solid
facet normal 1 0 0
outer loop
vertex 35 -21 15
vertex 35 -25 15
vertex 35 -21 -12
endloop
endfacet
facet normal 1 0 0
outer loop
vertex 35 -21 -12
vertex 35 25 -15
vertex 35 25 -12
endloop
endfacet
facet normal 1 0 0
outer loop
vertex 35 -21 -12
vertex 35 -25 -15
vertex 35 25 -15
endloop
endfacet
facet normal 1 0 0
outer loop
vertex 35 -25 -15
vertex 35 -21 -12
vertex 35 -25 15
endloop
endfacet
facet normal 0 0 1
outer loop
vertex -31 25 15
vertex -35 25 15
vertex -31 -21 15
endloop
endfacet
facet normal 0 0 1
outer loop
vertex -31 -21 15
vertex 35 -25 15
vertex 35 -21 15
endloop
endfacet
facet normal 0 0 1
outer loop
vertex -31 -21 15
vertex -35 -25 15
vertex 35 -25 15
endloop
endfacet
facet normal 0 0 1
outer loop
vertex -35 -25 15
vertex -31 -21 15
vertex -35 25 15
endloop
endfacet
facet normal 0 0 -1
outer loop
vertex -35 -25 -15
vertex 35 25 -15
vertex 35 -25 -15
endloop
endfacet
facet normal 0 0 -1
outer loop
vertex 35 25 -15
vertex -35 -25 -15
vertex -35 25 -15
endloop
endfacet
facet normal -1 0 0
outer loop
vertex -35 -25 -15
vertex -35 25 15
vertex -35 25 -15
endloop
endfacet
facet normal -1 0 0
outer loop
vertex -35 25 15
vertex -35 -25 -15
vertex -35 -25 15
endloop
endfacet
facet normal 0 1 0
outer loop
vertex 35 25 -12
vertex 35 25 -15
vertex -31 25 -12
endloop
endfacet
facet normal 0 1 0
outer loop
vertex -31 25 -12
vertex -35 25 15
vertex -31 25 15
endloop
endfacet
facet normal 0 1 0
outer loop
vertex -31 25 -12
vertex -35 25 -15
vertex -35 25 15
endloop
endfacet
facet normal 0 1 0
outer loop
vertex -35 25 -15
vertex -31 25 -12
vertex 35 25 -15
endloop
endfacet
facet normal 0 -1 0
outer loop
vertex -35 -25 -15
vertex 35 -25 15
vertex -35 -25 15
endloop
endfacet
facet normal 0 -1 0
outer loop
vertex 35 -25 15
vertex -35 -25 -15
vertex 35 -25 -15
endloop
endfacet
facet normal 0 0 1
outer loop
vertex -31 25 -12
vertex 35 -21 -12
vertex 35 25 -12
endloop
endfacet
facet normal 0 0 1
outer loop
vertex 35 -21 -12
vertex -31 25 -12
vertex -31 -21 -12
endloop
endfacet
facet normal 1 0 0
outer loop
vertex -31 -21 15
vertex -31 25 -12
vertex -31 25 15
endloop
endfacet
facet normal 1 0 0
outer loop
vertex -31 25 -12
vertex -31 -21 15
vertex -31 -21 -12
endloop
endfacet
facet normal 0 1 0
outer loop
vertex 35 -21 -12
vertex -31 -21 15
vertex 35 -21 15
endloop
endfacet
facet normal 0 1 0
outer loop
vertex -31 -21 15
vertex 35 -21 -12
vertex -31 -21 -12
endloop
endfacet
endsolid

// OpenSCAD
$fn = 128; // High resolution for smooth curves and precise fits

// --- Part 1: Box Dimensions ---
// Outer dimensions (X x Y x Z)
BOX_OUT_X = 70;
BOX_OUT_Y = 50;
BOX_OUT_Z = 30;

// Wall and floor thickness
WALL_THICKNESS = 2;
FLOOR_THICKNESS = 2;

// --- Part 2: Lid Dimensions ---
// Plate dimensions (same as box outer footprint)
LID_PLATE_X = 70;
LID_PLATE_Y = 50;
LID_PLATE_Z = 2; // Thickness of the base plate

// Lip dimensions
LIP_WALL_THICKNESS = 1.5;
LIP_HEIGHT = 4; // Height of the lip above the plate

// Lip outer size (calculated to provide 0.2mm clearance inside the 70x50 box)
// Box inner width = 70 - 2*2 = 66. Target clearance = 0.2. Lip width = 66 - 2*0.2 = 65.6
// Box inner depth = 50 - 2*2 = 46. Target clearance = 0.2. Lip depth = 46 - 2*0.2 = 45.6
LIP_OUT_X = 65.6;
LIP_OUT_Y = 45.6;

// --- Assembly Positioning ---
// Gap between parts
GAP = 10;

// Positioning variables
// Box is centred at X=0, Y=0, Z=0 (bottom at 0)
// Lid is placed on the +X side with a 10mm gap
// Lid X position = (Box X / 2) + GAP + (Lid X / 2)
// Lid Y position = 0 (centred)
// Lid Z position = 0 (bottom at 0)
LID_X_OFFSET = (BOX_OUT_X / 2) + GAP + (LID_PLATE_X / 2);

module box() {
    // Create the box shell
    // We use a single difference to create the hollow box
    difference() {
        // Outer block
        translate([0, 0, 0])
            cube([BOX_OUT_X, BOX_OUT_Y, BOX_OUT_Z], center = true);
        
        // Inner void (negative space)
        // Inner dimensions:
        // X: 70 - 2*2 = 66
        // Y: 50 - 2*2 = 46
        // Z: 30 - 2 (floor) = 28
        // We translate the inner cube so its bottom is at Z = FLOOR_THICKNESS
        translate([WALL_THICKNESS, WALL_THICKNESS, FLOOR_THICKNESS])
            cube([
                BOX_OUT_X - 2*WALL_THICKNESS,
                BOX_OUT_Y - 2*WALL_THICKNESS,
                BOX_OUT_Z - FLOOR_THICKNESS
            ], center = true);
    }
}

module lid() {
    // The lid consists of a base plate and a lip.
    // We model this as a solid block with the lip extruded, then subtract the hole for the board.
    
    // 1. Create the base plate
    // Dimensions: 70 x 50 x 2
    // The lip sits on top of this plate.
    
    // 2. Create the lip
    // The lip is a wall of thickness 1.5mm and height 4mm.
    // Outer size of lip: 65.6 x 45.6
    // Inner size of lip (hole for board): 65.6 - 2*1.5 = 62.6 x 45.6 - 2*1.5 = 42.6
    
    // We construct the lid by:
    // a) Creating the full solid block (plate + lip volume)
    // b) Subtracting the hole for the electronics board
    
    difference() {
        // --- Solid Geometry Construction ---
        
        // Start with the base plate
        // Dimensions: 70 x 50 x 2
        // Bottom at Z=0, Top at Z=2
        translate([0, 0, 0])
            cube([LID_PLATE_X, LID_PLATE_Y, LID_PLATE_Z], center = true);
        
        // Add the lip on top
        // Lip is centered on the plate.
        // Lip thickness is 1.5, so it extends 0.75 above and below the top surface of the plate.
        // However, since we are building up, we can just add a block of height (2 + 1.5) = 3.5
        // but we need to ensure the bottom of the lip is flush with the top of the plate.
        // Easier approach: Add a block of height (LID_PLATE_Z + LIP_HEIGHT) centered at Z=0?
        // No, let's keep Z=0 as the bottom of the plate.
        
        // Let's rebuild the solid logic to be cleaner:
        // Union of Plate and Lip.
        
        // Plate: 70 x 50 x 2, centered at Z=1 (bottom at Z=0)
        // Lip: 65.6 x 45.6 x (2 + 1.5), centered at Z=1 (bottom at Z=0)
        // Wait, the prompt says "lip on top of it".
        // So Plate is 2mm thick. Lip is 4mm tall sitting on top.
        // Total height = 6mm.
        
        // Let's define the solid union first.
        union() {
            // Base Plate
            translate([0, 0, 0])
                cube([LID_PLATE_X, LID_PLATE_Y, LID_PLATE_Z], center = true);
            
            // Lip (sitting on top of plate)
            // Lip outer size: 65.6 x 45.6
            // Lip thickness: 1.5
            // Lip height: 4
            // Position: Centered on plate (X,Y), Bottom at Z = LID_PLATE_Z
            translate([0, 0, LID_PLATE_Z])
                cube([LIP_OUT_X, LIP_OUT_Y, LIP_HEIGHT], center = true);
        }
        
        // --- Subtraction: Hole for Board ---
        // The hole must go through the entire thickness (Plate + Lip).
        // Total thickness = 2 + 4 = 6mm.
        // Hole dimensions:
        // X: Lip Outer X - 2 * Lip Wall Thickness = 65.6 - 3 = 62.6
        // Y: Lip Outer Y - 2 * Lip Wall Thickness = 45.6 - 3 = 42.6
        
        translate([0, 0, 0])
            cube([
                LIP_OUT_X - 2*LIP_WALL_THICKNESS,
                LIP_OUT_Y - 2*LIP_WALL_THICKNESS,
                LID_PLATE_Z + LIP_HEIGHT
            ], center = true);
    }
}

// --- Main Assembly ---
// Combine Box and Lid with the specified gap
// Box is at origin
translate([0, 0, 0])
    box();

// Lid is on the +X side
translate([LID_X_OFFSET, 0, 0])
    lid();
